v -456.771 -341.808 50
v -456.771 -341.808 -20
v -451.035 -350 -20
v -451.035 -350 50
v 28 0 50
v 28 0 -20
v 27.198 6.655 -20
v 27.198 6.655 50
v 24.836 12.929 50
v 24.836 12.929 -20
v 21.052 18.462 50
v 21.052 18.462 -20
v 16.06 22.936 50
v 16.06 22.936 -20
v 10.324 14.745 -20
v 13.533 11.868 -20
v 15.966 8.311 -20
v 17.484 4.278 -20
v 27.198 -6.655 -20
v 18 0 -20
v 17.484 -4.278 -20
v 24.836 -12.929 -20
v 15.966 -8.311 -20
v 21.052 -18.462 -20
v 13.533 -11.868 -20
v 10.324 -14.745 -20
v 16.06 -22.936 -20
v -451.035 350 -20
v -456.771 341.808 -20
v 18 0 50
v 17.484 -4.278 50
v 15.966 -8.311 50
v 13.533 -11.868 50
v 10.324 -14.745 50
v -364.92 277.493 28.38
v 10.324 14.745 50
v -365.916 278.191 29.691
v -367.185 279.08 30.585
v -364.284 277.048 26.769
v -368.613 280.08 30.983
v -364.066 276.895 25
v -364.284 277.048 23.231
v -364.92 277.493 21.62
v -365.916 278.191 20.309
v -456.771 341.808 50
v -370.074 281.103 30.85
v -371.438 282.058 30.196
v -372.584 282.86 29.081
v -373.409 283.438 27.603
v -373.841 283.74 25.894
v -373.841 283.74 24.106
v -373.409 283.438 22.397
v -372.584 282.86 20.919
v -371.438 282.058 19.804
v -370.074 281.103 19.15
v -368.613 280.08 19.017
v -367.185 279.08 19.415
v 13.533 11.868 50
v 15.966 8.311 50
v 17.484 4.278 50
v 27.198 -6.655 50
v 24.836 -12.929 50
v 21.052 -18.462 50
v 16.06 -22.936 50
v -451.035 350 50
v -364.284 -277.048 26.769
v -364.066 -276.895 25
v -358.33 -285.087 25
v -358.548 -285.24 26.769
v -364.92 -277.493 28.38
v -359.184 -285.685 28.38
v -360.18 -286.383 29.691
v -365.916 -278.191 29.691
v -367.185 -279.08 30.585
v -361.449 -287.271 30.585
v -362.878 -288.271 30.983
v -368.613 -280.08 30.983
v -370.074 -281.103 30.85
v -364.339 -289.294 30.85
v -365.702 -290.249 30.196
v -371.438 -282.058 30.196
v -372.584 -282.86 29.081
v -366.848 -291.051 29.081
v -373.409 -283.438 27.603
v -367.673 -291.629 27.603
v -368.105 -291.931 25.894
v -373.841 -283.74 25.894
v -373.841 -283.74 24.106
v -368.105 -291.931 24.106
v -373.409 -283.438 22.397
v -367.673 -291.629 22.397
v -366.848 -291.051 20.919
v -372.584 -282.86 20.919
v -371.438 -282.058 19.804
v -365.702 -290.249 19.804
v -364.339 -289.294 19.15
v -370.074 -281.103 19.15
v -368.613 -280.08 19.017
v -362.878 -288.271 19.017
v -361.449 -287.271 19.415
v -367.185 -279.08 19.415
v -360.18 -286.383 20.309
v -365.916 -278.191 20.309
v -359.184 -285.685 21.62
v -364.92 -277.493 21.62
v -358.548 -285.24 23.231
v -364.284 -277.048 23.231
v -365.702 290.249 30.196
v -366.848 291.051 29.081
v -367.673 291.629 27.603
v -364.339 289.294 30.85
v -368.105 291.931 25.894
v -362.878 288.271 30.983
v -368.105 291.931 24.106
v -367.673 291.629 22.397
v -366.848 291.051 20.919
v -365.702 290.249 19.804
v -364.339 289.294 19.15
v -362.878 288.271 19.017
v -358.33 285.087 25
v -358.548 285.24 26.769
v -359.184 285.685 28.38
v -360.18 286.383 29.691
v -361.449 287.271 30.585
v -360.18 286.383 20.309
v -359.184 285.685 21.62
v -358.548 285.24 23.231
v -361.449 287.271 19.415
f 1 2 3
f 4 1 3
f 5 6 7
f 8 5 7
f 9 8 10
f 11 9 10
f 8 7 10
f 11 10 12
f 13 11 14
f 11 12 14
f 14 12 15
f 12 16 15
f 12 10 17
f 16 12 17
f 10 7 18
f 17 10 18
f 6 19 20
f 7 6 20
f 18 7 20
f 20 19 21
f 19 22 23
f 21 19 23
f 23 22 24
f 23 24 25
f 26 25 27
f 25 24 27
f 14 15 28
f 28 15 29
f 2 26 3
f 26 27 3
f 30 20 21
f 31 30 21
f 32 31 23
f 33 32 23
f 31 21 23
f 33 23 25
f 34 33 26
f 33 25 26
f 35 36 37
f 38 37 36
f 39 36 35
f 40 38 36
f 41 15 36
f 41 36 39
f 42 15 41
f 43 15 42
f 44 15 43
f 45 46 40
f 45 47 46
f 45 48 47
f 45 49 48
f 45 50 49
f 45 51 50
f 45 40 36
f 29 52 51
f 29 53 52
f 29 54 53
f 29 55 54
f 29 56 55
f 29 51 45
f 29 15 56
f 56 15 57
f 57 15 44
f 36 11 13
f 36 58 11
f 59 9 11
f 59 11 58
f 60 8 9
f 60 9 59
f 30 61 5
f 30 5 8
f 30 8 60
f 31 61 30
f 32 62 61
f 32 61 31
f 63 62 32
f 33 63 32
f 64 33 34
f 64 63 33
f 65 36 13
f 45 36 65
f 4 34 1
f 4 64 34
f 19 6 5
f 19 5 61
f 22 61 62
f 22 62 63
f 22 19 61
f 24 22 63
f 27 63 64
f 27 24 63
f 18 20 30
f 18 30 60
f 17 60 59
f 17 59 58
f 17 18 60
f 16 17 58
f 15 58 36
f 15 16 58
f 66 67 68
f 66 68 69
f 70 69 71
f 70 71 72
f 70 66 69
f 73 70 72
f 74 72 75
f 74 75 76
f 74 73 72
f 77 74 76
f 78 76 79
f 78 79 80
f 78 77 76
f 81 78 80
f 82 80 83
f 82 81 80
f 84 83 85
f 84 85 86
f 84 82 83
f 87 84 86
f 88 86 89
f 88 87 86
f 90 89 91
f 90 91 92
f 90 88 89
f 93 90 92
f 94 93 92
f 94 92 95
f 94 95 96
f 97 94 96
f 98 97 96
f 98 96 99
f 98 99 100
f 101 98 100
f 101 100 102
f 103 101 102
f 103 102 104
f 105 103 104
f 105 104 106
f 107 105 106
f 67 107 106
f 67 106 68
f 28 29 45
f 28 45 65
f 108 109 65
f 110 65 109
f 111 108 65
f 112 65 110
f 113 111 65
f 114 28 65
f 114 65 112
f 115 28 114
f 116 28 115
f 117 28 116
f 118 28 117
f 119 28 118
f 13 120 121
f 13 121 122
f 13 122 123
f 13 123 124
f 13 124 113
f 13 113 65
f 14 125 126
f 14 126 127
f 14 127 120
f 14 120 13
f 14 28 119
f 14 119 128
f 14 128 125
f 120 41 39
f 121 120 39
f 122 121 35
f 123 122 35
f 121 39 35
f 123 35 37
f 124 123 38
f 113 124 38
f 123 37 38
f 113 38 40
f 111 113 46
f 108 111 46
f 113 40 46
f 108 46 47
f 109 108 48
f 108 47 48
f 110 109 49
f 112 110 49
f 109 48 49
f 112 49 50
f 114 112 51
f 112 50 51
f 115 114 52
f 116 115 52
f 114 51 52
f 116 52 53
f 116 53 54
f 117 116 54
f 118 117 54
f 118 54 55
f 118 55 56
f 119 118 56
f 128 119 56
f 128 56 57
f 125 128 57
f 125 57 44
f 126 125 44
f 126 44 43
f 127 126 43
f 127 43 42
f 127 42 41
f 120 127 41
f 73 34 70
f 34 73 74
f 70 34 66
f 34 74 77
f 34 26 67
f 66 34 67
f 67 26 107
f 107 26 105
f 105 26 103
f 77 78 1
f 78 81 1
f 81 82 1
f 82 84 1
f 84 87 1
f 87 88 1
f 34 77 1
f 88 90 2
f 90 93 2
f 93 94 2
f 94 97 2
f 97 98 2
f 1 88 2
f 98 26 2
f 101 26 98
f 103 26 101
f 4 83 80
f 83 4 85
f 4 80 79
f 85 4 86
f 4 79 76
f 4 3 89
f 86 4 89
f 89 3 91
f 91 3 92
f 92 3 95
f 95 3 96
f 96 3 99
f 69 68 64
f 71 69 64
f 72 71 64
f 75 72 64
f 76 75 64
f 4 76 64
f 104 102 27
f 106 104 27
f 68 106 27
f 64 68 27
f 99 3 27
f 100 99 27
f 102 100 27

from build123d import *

# Parameters (mm, degrees)
PAD002_DEPTH           = 70
SKETCH006_R            = 6
POCKET002_DEPTH        = 30
SKETCH007_R            = 6
POCKET003_DEPTH        = 284.764355719
LINEARPATTERN001_COUNT = 4
LINEARPATTERN001_PITCH = 173.3333333333


with BuildPart() as part:
    # Sketch004 → Pad002 (new body)
    with BuildSketch(Plane.XY):
        with BuildLine():
            Line((-451.0352920823, 350), (16.0601402178, 22.9362572401))
            ThreePointArc((28, 0), (24.836303329, 12.9289611706), (16.0601402178, 22.9362572401))
            Line((18, 0), (28, 0))
            ThreePointArc((18, 0), (15.9661949972, 8.3114750382), (10.3243758543, 14.7447367972))
            Line((10.3243758543, 14.7447367972), (-456.7710564459, 341.8084795571))
            Line((-456.7710564459, 341.8084795571), (-451.0352920823, 350))
        make_face()
    extrude(amount=PAD002_DEPTH)

    # Sketch006 → Pocket002 (cut)
    with BuildSketch(Plane(origin=(0, 126.75, 0), x_dir=(-1, 0, 0), z_dir=(0, 1, 0))):
        with Locations((26.7405688034, 25.24131)):
            Circle(SKETCH006_R)
    extrude(amount=-POCKET002_DEPTH, mode=Mode.SUBTRACT)

    # Sketch007 (on Face2 of Pocket002) → Pocket003 (cut, through all)
    with BuildSketch(Plane(origin=(10.3243758543, 14.7447367972, 0), x_dir=(0.8191520443, -0.5735764364, 0), z_dir=(-0.5735764364, -0.8191520443, 0))):
        with Locations((-463.0458944975, 45)):
            Circle(SKETCH007_R)
    pocket003 = extrude(amount=-POCKET003_DEPTH, mode=Mode.SUBTRACT)

    # LinearPattern001: Pocket003 ×4
    with Locations(*[Vector(-0.8191520443, 0.5735764364, 0) * (i * LINEARPATTERN001_PITCH) for i in range(1, LINEARPATTERN001_COUNT)]):
        add(pocket003, mode=Mode.SUBTRACT)

    # Mirrored001: part across XZ


with BuildPart() as part_1:
    add(part.part)
    add(part.part.mirror(Plane.XZ))


with BuildPart() as part_2:
    # Body001 placement: moved
    add(part_1.part.moved(Location((0, 0, -20))))


solid = part_2.part
